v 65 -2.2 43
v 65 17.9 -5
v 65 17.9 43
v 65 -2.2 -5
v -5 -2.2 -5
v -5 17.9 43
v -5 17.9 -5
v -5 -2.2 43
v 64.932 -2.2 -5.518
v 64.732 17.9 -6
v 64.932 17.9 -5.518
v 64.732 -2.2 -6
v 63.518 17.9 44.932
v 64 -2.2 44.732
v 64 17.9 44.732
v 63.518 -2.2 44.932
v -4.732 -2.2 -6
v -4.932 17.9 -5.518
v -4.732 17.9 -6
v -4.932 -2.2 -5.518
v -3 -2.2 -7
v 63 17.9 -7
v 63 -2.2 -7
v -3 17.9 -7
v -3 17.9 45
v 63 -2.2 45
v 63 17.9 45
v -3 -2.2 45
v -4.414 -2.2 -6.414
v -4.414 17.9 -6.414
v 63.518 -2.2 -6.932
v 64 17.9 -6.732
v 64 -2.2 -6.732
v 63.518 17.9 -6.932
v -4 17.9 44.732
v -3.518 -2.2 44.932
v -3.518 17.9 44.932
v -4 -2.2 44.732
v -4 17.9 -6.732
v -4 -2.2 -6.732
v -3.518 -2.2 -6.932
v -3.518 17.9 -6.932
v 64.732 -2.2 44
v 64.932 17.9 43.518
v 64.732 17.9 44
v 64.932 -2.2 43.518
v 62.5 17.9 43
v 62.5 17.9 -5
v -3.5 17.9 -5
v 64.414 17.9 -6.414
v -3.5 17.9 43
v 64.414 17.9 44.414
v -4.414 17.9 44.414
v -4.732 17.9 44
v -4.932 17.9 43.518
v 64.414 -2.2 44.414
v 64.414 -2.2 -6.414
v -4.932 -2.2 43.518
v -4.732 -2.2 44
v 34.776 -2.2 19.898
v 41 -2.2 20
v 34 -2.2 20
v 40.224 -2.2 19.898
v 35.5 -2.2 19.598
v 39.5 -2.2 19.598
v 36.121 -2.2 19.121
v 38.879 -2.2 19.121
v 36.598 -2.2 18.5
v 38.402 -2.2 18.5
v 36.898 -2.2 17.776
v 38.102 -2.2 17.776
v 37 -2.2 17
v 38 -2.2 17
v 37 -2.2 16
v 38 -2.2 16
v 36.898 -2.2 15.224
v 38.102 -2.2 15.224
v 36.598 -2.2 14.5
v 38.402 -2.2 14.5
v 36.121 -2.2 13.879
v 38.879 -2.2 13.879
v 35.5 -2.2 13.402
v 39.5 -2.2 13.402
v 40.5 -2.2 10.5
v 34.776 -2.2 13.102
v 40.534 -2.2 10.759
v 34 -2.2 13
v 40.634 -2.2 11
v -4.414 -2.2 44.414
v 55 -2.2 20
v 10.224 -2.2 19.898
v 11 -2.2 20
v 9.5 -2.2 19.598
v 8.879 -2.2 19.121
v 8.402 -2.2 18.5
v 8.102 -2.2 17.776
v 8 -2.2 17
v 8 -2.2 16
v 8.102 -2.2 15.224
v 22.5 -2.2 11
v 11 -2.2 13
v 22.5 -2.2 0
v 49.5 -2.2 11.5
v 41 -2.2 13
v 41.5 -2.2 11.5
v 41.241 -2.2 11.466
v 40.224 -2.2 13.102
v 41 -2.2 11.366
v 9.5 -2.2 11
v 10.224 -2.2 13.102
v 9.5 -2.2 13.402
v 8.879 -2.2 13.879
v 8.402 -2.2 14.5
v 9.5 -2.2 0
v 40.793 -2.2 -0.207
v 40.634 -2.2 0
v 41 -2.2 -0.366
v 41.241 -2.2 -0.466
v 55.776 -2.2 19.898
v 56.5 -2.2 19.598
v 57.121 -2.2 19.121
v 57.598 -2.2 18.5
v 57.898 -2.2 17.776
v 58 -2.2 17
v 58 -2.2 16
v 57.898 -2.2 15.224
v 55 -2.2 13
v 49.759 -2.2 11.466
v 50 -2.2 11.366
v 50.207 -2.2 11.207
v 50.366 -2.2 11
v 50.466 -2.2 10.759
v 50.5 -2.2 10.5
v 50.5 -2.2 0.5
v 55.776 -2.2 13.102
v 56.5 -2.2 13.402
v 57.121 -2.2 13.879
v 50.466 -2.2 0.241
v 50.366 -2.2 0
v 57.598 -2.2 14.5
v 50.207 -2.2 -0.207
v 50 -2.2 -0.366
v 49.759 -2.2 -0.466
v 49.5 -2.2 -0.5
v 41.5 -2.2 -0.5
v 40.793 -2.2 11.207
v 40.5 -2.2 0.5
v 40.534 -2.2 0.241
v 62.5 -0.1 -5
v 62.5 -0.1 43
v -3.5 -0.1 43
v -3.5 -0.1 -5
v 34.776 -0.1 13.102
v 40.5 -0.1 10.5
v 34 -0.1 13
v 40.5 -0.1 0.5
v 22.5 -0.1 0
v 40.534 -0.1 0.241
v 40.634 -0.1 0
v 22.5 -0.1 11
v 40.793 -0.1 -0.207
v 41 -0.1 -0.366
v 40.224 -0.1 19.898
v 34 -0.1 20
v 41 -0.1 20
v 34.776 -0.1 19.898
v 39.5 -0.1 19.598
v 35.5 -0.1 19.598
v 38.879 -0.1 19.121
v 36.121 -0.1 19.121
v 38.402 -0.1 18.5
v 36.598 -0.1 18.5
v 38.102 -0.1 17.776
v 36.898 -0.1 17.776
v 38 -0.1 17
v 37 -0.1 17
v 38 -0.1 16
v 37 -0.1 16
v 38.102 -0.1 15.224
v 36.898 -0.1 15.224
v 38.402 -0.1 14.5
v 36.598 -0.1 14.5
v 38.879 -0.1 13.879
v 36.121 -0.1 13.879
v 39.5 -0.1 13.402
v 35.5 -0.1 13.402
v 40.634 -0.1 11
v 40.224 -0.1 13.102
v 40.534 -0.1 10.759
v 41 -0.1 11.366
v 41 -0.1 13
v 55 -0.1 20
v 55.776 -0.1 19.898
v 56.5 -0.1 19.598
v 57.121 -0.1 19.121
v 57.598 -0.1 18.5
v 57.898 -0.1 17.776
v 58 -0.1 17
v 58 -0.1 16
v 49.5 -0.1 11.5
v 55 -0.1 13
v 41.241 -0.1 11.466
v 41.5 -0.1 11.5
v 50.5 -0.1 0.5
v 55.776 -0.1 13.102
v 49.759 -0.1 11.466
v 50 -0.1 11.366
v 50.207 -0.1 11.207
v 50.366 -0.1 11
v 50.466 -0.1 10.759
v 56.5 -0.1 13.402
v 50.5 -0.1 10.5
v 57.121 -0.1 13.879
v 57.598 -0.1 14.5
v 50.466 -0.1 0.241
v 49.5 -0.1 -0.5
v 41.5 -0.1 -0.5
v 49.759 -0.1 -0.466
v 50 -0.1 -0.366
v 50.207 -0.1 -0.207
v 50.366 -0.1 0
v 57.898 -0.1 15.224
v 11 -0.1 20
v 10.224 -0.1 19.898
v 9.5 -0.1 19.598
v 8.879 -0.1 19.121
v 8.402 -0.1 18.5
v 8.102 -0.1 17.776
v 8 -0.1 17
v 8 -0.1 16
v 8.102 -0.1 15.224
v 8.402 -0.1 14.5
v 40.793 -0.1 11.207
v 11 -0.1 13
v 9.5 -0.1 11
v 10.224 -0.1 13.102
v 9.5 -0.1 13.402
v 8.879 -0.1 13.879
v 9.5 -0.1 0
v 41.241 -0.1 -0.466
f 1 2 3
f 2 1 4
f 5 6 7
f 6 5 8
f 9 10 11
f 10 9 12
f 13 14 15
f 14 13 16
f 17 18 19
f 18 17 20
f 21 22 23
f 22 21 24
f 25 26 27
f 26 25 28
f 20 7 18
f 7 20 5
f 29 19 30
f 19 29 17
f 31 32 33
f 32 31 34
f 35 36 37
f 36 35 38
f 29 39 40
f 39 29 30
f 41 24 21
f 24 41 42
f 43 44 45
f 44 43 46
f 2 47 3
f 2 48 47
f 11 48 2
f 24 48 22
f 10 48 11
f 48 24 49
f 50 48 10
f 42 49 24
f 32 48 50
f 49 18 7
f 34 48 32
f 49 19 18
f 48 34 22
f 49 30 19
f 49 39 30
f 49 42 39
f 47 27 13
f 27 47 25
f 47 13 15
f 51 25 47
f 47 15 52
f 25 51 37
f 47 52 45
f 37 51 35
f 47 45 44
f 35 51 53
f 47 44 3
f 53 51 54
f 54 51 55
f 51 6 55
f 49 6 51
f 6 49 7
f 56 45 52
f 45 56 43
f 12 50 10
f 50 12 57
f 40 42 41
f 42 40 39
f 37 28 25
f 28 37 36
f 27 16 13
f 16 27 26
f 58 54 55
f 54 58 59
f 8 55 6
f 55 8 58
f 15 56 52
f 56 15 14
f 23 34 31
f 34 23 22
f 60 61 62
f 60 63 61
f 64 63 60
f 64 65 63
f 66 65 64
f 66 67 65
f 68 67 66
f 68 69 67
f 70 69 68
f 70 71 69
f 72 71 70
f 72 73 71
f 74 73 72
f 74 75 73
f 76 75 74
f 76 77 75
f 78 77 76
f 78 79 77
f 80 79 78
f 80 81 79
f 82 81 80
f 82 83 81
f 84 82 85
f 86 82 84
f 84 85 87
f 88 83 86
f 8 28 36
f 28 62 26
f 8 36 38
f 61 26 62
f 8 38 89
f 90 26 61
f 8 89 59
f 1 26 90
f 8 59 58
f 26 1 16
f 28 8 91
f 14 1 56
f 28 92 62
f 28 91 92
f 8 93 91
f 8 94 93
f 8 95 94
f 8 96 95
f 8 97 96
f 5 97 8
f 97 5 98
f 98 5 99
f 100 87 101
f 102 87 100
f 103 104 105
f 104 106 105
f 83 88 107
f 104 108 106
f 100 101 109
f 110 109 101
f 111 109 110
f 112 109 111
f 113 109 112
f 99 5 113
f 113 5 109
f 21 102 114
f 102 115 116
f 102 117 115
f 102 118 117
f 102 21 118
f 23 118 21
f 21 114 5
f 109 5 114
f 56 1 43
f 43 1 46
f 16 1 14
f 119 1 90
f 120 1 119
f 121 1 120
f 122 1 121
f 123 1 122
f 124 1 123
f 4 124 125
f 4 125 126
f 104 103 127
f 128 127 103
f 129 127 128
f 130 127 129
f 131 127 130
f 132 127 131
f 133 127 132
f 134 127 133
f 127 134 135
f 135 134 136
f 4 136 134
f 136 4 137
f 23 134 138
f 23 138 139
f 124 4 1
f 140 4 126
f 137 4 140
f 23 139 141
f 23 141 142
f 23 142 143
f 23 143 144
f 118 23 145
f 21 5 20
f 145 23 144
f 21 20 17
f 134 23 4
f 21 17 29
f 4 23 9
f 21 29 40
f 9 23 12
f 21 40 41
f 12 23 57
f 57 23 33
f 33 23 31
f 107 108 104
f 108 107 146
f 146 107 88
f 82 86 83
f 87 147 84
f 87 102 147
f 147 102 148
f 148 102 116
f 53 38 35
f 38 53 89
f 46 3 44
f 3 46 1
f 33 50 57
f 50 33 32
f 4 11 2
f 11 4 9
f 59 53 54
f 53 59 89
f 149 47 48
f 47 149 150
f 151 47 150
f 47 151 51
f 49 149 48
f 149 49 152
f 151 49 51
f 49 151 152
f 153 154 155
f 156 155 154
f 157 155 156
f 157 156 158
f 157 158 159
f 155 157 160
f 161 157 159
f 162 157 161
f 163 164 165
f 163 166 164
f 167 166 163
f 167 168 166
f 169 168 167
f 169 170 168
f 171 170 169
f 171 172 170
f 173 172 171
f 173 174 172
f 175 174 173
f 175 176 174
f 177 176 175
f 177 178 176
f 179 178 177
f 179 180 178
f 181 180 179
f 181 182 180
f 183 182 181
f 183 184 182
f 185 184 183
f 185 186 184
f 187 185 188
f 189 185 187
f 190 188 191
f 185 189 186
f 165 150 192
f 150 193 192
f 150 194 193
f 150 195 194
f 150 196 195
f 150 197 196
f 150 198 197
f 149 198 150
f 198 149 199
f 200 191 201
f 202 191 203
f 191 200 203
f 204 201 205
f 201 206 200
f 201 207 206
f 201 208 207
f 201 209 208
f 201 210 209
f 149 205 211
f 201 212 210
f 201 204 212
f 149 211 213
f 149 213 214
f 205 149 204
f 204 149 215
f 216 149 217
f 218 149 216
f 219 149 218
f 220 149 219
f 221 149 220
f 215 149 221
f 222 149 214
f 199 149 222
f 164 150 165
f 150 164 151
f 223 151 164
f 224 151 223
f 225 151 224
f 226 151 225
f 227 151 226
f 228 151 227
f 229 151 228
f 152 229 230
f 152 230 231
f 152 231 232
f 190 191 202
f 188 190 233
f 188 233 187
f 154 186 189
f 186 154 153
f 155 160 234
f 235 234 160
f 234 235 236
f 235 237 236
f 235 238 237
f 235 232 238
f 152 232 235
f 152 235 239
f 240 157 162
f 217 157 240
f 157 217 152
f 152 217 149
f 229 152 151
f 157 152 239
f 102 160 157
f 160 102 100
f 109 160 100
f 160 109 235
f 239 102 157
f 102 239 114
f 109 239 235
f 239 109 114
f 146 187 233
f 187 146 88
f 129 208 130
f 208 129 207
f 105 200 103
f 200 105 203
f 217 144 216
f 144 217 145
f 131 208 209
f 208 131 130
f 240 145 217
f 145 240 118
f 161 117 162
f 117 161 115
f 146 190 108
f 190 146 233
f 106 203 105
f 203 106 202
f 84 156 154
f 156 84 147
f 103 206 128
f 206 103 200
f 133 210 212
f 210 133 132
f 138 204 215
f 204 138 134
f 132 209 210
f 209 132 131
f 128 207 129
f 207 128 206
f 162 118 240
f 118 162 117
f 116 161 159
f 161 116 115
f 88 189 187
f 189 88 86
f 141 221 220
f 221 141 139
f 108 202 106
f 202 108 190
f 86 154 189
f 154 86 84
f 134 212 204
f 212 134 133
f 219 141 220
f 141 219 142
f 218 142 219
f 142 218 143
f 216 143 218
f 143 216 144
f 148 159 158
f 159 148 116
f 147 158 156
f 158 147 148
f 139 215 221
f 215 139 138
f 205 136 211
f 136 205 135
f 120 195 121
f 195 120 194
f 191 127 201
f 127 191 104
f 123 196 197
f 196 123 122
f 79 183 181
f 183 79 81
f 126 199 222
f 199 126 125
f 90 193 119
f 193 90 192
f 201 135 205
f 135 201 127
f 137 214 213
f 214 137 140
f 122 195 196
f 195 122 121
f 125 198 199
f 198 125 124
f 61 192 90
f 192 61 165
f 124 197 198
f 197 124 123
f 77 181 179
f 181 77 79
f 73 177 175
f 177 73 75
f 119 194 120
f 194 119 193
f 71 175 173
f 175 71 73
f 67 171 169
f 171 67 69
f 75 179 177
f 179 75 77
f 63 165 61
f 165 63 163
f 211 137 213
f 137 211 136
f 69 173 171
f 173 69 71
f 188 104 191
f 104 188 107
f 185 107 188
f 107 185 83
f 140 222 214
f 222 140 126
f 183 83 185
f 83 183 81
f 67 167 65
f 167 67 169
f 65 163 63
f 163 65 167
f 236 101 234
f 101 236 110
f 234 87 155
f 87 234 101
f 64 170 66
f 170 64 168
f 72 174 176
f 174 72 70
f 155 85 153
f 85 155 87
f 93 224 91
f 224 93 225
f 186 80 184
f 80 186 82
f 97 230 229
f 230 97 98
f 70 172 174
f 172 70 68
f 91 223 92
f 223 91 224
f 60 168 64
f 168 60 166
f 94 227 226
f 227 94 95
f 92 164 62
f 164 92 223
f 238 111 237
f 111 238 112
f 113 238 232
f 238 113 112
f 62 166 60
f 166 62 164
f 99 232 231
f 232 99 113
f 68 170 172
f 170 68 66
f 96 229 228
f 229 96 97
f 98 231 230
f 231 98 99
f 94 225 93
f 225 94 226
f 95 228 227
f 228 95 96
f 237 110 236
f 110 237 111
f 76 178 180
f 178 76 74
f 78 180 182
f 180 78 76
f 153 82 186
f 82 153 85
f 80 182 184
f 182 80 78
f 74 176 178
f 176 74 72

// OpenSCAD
// (c) Koen Kooi 2011

// arduino:

$fn = 24;

module arduinomega() {
	union() {
		color([0.1,0.35,0.5]) translate([0,0,-1.6]) cube([53.3,101.64,1.6]);
		translate([10,-7,0.5]) color([0.8,0.8,0.8]) cube([12,16.5,10]); //usb
		translate([41,-2,0.5]) difference() {
			color([0,0,0]) cube([9,14,9]);
			translate(v=[4.5,5.9,5.5]) rotate(a=[90,0,0]) cylinder(r=3,h=6); 
		} //power
		translate([1.5,23,0]) color([0,0,0]) cube([2.4,20.7,8.5]); //shield
		translate([1.5,44.4,0]) color([0,0,0]) cube([2.4,20.7,8.5]); //shield
		translate([1.5,67.1,0]) color([0,0,0]) cube([2.4,20.7,8.5]); //shield
		translate([50,50,0]) color([0,0,0]) cube([2.4,20.7,8.5]); //shield
		translate([50,72,0]) color([0,0,0]) cube([2.4,20.7,8.5]); //shield
		translate([1.5,93,0]) color([0,0,0]) cube([46,5,8.5]); //shield
		translate([50,31.5,0]) color([0,0,0]) cube([2.4,16.7,8.5]); //shield
	}
}

module sdramps14() {
	union() {
		color([0,1,0]) cube([60.25,101.42,1.6]);
		translate([11.5,30,1.6]) color([0,0,0]) cube([2.4,20.7,8.5]); //pololu
		translate([11.5,51,1.6]) color([0,0,0]) cube([2.4,20.7,8.5]); //pololu
		translate([24,30,1.6]) color([0,0,0]) cube([2.4,20.7,8.5]); //pololu
		translate([24,51,1.6]) color([0,0,0]) cube([2.4,20.7,8.5]); //pololu
		translate([34,30,1.6]) color([0,0,0]) cube([2.4,20.7,8.5]); //pololu
		translate([34,51,1.6]) color([0,0,0]) cube([2.4,20.7,8.5]); //pololu
		translate([34,72,1.6]) color([0,0,0]) cube([2.4,20.7,8.5]); //pololu
		translate([47,30,1.6]) color([0,0,0]) cube([2.4,20.7,8.5]); //pololu
		translate([47,51,1.6]) color([0,0,0]) cube([2.4,20.7,8.5]); //pololu
		translate([47,72,1.6]) color([0,0,0]) cube([2.4,20.7,8.5]); //pololu

		translate([1.5,23,-2.45]) color([0,0,0]) cube([2.4,20.7,2.5]); //shield
		translate([1.5,44.4,-2.45]) color([0,0,0]) cube([2.4,20.7,2.5]); //shield
		translate([1.5,67.1,-2.45]) color([0,0,0]) cube([2.4,20.7,2.5]); //shield
		translate([50,50,-2.45]) color([0,0,0]) cube([2.4,20.7,2.5]); //shield
		translate([50,72,-2.45]) color([0,0,0]) cube([2.4,20.7,2.5]); //shield
		translate([1.5,93,-2.45]) color([0,0,0]) cube([46,5,2.5]); //shield
		translate([50,31.5,-2.45]) color([0,0,0]) cube([2.4,16.7,2.5]); //shield


		translate([6.5,10,1.6]) color([0,0,1]) cube([30,7.6,10]); // output
		translate([38,4,1.6]) color([0,0,1]) cube([20,7.6,10]); // input


	}
	translate([55,90,5]) color([0,1,0]) cube([27.3,16.3,1.6]);	
}

module doos() {
	color([0.3,0.3,0.3,0.95]) difference() { 
		minkowski()
		{
			cube([66,20,48]);
			//cylinder(r=2,h=0.1);
			rotate(a=[90,0,0]) cylinder(r=2, h=0.1);

		}
		translate([-0.5,2,0]) cube([66,121,48]);

		// slice off a corner to view the inside, disable for final model
		//translate(v=[70,-40,-10])  rotate(a=[0,0,45]) cube([40,40,70]);

		// arduino usb
		translate([12.5,-7,5]) cube([13,16.5,11]);

		// arduino power
		minkowski() {
			translate([44.5,-5,5.5]) cube([8,14,10]);
			rotate(a=[90.0,0]) cylinder(r=1,h=0.1);
		}

		// RAMPS power input
		minkowski() {
			translate([44,-3,21]) cube([14,7.6,1]);
			rotate(a=[90.0,0]) cylinder(r=3,h=0.1);
		}

		// RAMPS power output
		minkowski() {
			translate([14,-3,21]) cube([23,7.6,1]);
			rotate(a=[90.0,0]) cylinder(r=3,h=0.1);
		}
	}
	//translate([1,1,1.5]) color([1,0.0,0.0,1]) cube([5,118,2]);
	//translate([55,1,1.5]) color([1,0.0,0.0,1]) cube([5,118,2]);
	//translate([63,1,14]) color([1,0.0,0.0,1]) cube([5,80,2]);
}

//arduinomega();
//translate([0,0,11.1]) sdramps14();
translate([-3,-2.1,-5])doos(); 
